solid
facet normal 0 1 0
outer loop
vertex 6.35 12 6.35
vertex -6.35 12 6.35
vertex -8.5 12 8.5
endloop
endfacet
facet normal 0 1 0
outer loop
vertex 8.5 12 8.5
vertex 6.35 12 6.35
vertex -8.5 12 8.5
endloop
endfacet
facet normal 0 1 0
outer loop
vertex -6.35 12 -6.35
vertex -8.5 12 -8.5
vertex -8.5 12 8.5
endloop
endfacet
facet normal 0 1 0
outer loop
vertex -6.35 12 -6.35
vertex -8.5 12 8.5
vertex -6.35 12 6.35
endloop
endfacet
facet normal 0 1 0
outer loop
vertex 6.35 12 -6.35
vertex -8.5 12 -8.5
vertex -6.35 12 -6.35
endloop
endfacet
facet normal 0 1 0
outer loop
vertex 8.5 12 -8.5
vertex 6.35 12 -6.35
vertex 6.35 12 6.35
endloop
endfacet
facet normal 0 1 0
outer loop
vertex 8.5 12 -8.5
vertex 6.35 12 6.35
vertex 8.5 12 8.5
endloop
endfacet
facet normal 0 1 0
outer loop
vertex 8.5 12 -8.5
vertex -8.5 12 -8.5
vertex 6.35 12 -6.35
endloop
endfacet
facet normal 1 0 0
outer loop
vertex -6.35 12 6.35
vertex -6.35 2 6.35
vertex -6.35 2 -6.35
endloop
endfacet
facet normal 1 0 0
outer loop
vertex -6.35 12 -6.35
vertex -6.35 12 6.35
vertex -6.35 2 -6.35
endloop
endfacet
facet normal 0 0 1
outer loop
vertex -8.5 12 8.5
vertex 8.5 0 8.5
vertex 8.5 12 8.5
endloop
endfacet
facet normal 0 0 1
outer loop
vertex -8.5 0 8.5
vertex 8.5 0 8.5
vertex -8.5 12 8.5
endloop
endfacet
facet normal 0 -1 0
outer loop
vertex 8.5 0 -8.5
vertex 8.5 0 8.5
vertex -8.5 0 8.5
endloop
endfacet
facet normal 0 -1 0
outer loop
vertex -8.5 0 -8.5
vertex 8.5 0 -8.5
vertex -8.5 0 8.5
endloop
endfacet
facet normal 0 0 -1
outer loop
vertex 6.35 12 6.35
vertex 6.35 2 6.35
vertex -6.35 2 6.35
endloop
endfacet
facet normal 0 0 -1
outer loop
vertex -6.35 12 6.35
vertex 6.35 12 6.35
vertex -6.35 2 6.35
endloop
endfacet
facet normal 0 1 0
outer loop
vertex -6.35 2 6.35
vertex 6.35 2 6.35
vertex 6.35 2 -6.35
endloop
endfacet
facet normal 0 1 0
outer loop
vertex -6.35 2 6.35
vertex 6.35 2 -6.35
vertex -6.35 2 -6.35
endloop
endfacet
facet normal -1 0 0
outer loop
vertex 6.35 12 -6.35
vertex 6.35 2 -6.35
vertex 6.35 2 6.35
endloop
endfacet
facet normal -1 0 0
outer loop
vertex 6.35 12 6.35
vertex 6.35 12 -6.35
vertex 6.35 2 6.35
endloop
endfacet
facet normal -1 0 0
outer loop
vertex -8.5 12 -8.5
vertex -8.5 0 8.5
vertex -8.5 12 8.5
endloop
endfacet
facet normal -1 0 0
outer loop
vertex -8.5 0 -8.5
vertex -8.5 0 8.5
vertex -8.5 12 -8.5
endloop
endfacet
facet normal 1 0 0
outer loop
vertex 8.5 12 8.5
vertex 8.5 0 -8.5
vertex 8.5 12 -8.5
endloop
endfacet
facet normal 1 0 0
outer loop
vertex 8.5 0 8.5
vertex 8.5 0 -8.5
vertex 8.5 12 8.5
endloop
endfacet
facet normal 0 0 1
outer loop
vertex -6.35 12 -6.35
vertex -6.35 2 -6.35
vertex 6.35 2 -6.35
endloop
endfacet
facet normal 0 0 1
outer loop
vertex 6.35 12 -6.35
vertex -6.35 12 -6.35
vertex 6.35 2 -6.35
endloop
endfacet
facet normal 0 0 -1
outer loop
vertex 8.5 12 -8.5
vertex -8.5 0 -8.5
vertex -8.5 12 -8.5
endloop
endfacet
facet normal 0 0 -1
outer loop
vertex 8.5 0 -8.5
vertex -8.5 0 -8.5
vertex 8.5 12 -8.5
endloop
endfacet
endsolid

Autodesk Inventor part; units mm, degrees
ref_plane "YZ Plane" through (0, 0, 0) normal (1, 0, 0) x (0, 1, 0)
ref_plane "XZ Plane" through (0, 0, 0) normal (0, 1, 0) x (-1, 0, 0)
ref_plane "XY Plane" through (0, 0, 0) normal (0, 0, 1) x (1, 0, 0)
sketch "Sketch1" plane through (0, 0, 0) normal (0, 1, 0) x (-1, 0, 0)
  line L0 (-8.5, 8.5) -> (8.5, 8.5)
  line L1 (8.5, 8.5) -> (8.5, -8.5)
  line L2 (8.5, -8.5) -> (-8.5, -8.5)
  line L3 (-8.5, -8.5) -> (-8.5, 8.5)
  line L4 (-8.5, 8.5) -> (8.5, -8.5) construction
  line L5 (8.5, 8.5) -> (-8.5, -8.5) construction
  point P0 (0, 0)
  dimension "d0" = 17
  dimension "d1" = 17
extrude "Extrusion1" add sketch "Sketch1" along normal blind 2
sketch "Sketch2" plane through (0, 2, 0) normal (0, 1, 0) x (1, 0, 0)
  line L0 (8.5, 8.5) -> (-8.5, 8.5) projected
  line L1 (8.5, -8.5) -> (-8.5, -8.5)
  line L2 (-8.5, -8.5) -> (-8.5, 8.5)
  line L3 (-8.5, 8.5) -> (8.5, 8.5)
  line L4 (8.5, 8.5) -> (8.5, -8.5)
  line L5 (8.5, -8.5) -> (-8.5, 8.5) construction
  line L6 (-8.5, -8.5) -> (8.5, 8.5) construction
  line L7 (6.35, -6.35) -> (-6.35, -6.35)
  line L8 (-6.35, -6.35) -> (-6.35, 6.35)
  line L9 (-6.35, 6.35) -> (6.35, 6.35)
  line L10 (6.35, 6.35) -> (6.35, -6.35)
  line L11 (6.35, -6.35) -> (-6.35, 6.35) construction
  line L12 (-6.35, -6.35) -> (6.35, 6.35) construction
  point P0 (0, 0)
  dimension "d4" = 12.7
extrude "Extrusion2" add sketch "Sketch2" along normal blind 10
properties part number "bar_protector" material "Rubber, Butyl"
